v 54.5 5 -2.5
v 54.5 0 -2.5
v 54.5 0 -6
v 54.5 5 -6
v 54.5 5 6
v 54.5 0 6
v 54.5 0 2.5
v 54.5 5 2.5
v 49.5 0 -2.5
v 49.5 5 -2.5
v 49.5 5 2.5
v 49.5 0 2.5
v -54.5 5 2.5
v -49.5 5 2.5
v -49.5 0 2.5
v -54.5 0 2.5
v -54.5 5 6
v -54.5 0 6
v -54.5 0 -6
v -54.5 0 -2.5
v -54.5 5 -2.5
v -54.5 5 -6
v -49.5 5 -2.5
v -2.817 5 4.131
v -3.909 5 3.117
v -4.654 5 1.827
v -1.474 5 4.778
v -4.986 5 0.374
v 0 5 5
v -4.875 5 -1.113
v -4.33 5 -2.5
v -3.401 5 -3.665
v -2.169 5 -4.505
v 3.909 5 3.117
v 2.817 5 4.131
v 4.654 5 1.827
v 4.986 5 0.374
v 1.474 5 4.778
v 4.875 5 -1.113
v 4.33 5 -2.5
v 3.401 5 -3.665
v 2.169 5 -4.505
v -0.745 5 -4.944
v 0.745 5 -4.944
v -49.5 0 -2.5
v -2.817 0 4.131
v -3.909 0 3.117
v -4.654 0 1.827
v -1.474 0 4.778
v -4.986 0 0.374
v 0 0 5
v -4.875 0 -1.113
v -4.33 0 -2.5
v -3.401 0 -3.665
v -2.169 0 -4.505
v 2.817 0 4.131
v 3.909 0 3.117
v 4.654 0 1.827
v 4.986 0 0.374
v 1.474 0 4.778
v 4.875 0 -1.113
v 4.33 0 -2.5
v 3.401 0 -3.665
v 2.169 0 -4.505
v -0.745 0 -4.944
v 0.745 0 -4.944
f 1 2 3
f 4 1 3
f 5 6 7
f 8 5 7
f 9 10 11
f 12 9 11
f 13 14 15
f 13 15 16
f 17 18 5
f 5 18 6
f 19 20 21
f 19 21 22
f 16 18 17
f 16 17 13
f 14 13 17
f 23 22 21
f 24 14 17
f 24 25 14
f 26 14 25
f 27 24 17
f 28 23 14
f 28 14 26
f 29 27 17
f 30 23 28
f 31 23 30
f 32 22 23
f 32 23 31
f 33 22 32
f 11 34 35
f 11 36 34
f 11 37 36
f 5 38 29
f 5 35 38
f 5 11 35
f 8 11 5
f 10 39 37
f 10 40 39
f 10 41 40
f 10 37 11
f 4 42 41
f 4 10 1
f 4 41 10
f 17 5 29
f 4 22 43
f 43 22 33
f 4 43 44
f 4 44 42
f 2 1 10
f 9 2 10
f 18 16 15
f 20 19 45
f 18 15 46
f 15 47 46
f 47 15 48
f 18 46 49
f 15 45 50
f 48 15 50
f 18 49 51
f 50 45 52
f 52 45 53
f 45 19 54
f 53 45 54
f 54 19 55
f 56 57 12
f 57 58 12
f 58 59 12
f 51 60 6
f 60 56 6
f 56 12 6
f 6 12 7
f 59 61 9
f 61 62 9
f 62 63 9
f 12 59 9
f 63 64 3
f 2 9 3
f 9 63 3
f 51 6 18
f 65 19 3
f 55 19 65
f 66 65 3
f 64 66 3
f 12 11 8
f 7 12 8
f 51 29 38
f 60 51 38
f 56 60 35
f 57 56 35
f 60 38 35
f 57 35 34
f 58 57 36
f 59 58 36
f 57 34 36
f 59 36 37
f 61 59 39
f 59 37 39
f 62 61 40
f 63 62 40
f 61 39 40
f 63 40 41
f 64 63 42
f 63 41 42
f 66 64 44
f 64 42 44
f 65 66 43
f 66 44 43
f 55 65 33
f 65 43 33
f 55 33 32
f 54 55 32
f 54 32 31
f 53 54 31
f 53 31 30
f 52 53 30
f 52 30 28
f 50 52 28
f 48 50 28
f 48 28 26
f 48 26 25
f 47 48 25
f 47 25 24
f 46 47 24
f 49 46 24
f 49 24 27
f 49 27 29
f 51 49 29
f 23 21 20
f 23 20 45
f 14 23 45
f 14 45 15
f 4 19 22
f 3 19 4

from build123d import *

# Parameters (mm, degrees)
SKETCH1_W           = 109
SKETCH1_H           = 12
BOSS_EXTRUDE1_DEPTH = 5
SKETCH2_R           = 5
CUT_EXTRUDE2_DEPTH  = 56.056788864
CUT_EXTRUDE3_DEPTH  = 56.056788864


with BuildPart() as part:
    # Sketch1 → Boss-Extrude1 (new body)
    with BuildSketch(Plane(origin=(0, 0, 0), x_dir=(1, 0, 0), z_dir=(0, 1, 0))):
        Rectangle(SKETCH1_W, SKETCH1_H)
    extrude(amount=BOSS_EXTRUDE1_DEPTH)

    # Sketch2 → Cut-Extrude2 (cut, through all)
    with BuildSketch(Plane(origin=(0, 5, 0), x_dir=(1, 0, 0), z_dir=(0, 1, 0))):
        with Locations(Location((0, 0, 0), (0, 0, 270))):
            Circle(SKETCH2_R)
    extrude(amount=-CUT_EXTRUDE2_DEPTH, mode=Mode.SUBTRACT)

    # Sketch3 → Cut-Extrude3 (cut, through all)
    with BuildSketch(Plane(origin=(0, 5, 0), x_dir=(1, 0, 0), z_dir=(0, 1, 0))):
        Polygon((-54.5, 0), (-54.5, 2.5), (-49.5, 2.5), (-49.5, -2.5), (-54.5, -2.5), align=None)
    cut_extrude3 = extrude(amount=-CUT_EXTRUDE3_DEPTH, mode=Mode.SUBTRACT)

    # Mirror1: Cut-Extrude3 across plane
    add(cut_extrude3.mirror(Plane(origin=(0, 0, 0), x_dir=(0, 0, 1), z_dir=(1, 0, 0))), mode=Mode.SUBTRACT)


solid = part.part
